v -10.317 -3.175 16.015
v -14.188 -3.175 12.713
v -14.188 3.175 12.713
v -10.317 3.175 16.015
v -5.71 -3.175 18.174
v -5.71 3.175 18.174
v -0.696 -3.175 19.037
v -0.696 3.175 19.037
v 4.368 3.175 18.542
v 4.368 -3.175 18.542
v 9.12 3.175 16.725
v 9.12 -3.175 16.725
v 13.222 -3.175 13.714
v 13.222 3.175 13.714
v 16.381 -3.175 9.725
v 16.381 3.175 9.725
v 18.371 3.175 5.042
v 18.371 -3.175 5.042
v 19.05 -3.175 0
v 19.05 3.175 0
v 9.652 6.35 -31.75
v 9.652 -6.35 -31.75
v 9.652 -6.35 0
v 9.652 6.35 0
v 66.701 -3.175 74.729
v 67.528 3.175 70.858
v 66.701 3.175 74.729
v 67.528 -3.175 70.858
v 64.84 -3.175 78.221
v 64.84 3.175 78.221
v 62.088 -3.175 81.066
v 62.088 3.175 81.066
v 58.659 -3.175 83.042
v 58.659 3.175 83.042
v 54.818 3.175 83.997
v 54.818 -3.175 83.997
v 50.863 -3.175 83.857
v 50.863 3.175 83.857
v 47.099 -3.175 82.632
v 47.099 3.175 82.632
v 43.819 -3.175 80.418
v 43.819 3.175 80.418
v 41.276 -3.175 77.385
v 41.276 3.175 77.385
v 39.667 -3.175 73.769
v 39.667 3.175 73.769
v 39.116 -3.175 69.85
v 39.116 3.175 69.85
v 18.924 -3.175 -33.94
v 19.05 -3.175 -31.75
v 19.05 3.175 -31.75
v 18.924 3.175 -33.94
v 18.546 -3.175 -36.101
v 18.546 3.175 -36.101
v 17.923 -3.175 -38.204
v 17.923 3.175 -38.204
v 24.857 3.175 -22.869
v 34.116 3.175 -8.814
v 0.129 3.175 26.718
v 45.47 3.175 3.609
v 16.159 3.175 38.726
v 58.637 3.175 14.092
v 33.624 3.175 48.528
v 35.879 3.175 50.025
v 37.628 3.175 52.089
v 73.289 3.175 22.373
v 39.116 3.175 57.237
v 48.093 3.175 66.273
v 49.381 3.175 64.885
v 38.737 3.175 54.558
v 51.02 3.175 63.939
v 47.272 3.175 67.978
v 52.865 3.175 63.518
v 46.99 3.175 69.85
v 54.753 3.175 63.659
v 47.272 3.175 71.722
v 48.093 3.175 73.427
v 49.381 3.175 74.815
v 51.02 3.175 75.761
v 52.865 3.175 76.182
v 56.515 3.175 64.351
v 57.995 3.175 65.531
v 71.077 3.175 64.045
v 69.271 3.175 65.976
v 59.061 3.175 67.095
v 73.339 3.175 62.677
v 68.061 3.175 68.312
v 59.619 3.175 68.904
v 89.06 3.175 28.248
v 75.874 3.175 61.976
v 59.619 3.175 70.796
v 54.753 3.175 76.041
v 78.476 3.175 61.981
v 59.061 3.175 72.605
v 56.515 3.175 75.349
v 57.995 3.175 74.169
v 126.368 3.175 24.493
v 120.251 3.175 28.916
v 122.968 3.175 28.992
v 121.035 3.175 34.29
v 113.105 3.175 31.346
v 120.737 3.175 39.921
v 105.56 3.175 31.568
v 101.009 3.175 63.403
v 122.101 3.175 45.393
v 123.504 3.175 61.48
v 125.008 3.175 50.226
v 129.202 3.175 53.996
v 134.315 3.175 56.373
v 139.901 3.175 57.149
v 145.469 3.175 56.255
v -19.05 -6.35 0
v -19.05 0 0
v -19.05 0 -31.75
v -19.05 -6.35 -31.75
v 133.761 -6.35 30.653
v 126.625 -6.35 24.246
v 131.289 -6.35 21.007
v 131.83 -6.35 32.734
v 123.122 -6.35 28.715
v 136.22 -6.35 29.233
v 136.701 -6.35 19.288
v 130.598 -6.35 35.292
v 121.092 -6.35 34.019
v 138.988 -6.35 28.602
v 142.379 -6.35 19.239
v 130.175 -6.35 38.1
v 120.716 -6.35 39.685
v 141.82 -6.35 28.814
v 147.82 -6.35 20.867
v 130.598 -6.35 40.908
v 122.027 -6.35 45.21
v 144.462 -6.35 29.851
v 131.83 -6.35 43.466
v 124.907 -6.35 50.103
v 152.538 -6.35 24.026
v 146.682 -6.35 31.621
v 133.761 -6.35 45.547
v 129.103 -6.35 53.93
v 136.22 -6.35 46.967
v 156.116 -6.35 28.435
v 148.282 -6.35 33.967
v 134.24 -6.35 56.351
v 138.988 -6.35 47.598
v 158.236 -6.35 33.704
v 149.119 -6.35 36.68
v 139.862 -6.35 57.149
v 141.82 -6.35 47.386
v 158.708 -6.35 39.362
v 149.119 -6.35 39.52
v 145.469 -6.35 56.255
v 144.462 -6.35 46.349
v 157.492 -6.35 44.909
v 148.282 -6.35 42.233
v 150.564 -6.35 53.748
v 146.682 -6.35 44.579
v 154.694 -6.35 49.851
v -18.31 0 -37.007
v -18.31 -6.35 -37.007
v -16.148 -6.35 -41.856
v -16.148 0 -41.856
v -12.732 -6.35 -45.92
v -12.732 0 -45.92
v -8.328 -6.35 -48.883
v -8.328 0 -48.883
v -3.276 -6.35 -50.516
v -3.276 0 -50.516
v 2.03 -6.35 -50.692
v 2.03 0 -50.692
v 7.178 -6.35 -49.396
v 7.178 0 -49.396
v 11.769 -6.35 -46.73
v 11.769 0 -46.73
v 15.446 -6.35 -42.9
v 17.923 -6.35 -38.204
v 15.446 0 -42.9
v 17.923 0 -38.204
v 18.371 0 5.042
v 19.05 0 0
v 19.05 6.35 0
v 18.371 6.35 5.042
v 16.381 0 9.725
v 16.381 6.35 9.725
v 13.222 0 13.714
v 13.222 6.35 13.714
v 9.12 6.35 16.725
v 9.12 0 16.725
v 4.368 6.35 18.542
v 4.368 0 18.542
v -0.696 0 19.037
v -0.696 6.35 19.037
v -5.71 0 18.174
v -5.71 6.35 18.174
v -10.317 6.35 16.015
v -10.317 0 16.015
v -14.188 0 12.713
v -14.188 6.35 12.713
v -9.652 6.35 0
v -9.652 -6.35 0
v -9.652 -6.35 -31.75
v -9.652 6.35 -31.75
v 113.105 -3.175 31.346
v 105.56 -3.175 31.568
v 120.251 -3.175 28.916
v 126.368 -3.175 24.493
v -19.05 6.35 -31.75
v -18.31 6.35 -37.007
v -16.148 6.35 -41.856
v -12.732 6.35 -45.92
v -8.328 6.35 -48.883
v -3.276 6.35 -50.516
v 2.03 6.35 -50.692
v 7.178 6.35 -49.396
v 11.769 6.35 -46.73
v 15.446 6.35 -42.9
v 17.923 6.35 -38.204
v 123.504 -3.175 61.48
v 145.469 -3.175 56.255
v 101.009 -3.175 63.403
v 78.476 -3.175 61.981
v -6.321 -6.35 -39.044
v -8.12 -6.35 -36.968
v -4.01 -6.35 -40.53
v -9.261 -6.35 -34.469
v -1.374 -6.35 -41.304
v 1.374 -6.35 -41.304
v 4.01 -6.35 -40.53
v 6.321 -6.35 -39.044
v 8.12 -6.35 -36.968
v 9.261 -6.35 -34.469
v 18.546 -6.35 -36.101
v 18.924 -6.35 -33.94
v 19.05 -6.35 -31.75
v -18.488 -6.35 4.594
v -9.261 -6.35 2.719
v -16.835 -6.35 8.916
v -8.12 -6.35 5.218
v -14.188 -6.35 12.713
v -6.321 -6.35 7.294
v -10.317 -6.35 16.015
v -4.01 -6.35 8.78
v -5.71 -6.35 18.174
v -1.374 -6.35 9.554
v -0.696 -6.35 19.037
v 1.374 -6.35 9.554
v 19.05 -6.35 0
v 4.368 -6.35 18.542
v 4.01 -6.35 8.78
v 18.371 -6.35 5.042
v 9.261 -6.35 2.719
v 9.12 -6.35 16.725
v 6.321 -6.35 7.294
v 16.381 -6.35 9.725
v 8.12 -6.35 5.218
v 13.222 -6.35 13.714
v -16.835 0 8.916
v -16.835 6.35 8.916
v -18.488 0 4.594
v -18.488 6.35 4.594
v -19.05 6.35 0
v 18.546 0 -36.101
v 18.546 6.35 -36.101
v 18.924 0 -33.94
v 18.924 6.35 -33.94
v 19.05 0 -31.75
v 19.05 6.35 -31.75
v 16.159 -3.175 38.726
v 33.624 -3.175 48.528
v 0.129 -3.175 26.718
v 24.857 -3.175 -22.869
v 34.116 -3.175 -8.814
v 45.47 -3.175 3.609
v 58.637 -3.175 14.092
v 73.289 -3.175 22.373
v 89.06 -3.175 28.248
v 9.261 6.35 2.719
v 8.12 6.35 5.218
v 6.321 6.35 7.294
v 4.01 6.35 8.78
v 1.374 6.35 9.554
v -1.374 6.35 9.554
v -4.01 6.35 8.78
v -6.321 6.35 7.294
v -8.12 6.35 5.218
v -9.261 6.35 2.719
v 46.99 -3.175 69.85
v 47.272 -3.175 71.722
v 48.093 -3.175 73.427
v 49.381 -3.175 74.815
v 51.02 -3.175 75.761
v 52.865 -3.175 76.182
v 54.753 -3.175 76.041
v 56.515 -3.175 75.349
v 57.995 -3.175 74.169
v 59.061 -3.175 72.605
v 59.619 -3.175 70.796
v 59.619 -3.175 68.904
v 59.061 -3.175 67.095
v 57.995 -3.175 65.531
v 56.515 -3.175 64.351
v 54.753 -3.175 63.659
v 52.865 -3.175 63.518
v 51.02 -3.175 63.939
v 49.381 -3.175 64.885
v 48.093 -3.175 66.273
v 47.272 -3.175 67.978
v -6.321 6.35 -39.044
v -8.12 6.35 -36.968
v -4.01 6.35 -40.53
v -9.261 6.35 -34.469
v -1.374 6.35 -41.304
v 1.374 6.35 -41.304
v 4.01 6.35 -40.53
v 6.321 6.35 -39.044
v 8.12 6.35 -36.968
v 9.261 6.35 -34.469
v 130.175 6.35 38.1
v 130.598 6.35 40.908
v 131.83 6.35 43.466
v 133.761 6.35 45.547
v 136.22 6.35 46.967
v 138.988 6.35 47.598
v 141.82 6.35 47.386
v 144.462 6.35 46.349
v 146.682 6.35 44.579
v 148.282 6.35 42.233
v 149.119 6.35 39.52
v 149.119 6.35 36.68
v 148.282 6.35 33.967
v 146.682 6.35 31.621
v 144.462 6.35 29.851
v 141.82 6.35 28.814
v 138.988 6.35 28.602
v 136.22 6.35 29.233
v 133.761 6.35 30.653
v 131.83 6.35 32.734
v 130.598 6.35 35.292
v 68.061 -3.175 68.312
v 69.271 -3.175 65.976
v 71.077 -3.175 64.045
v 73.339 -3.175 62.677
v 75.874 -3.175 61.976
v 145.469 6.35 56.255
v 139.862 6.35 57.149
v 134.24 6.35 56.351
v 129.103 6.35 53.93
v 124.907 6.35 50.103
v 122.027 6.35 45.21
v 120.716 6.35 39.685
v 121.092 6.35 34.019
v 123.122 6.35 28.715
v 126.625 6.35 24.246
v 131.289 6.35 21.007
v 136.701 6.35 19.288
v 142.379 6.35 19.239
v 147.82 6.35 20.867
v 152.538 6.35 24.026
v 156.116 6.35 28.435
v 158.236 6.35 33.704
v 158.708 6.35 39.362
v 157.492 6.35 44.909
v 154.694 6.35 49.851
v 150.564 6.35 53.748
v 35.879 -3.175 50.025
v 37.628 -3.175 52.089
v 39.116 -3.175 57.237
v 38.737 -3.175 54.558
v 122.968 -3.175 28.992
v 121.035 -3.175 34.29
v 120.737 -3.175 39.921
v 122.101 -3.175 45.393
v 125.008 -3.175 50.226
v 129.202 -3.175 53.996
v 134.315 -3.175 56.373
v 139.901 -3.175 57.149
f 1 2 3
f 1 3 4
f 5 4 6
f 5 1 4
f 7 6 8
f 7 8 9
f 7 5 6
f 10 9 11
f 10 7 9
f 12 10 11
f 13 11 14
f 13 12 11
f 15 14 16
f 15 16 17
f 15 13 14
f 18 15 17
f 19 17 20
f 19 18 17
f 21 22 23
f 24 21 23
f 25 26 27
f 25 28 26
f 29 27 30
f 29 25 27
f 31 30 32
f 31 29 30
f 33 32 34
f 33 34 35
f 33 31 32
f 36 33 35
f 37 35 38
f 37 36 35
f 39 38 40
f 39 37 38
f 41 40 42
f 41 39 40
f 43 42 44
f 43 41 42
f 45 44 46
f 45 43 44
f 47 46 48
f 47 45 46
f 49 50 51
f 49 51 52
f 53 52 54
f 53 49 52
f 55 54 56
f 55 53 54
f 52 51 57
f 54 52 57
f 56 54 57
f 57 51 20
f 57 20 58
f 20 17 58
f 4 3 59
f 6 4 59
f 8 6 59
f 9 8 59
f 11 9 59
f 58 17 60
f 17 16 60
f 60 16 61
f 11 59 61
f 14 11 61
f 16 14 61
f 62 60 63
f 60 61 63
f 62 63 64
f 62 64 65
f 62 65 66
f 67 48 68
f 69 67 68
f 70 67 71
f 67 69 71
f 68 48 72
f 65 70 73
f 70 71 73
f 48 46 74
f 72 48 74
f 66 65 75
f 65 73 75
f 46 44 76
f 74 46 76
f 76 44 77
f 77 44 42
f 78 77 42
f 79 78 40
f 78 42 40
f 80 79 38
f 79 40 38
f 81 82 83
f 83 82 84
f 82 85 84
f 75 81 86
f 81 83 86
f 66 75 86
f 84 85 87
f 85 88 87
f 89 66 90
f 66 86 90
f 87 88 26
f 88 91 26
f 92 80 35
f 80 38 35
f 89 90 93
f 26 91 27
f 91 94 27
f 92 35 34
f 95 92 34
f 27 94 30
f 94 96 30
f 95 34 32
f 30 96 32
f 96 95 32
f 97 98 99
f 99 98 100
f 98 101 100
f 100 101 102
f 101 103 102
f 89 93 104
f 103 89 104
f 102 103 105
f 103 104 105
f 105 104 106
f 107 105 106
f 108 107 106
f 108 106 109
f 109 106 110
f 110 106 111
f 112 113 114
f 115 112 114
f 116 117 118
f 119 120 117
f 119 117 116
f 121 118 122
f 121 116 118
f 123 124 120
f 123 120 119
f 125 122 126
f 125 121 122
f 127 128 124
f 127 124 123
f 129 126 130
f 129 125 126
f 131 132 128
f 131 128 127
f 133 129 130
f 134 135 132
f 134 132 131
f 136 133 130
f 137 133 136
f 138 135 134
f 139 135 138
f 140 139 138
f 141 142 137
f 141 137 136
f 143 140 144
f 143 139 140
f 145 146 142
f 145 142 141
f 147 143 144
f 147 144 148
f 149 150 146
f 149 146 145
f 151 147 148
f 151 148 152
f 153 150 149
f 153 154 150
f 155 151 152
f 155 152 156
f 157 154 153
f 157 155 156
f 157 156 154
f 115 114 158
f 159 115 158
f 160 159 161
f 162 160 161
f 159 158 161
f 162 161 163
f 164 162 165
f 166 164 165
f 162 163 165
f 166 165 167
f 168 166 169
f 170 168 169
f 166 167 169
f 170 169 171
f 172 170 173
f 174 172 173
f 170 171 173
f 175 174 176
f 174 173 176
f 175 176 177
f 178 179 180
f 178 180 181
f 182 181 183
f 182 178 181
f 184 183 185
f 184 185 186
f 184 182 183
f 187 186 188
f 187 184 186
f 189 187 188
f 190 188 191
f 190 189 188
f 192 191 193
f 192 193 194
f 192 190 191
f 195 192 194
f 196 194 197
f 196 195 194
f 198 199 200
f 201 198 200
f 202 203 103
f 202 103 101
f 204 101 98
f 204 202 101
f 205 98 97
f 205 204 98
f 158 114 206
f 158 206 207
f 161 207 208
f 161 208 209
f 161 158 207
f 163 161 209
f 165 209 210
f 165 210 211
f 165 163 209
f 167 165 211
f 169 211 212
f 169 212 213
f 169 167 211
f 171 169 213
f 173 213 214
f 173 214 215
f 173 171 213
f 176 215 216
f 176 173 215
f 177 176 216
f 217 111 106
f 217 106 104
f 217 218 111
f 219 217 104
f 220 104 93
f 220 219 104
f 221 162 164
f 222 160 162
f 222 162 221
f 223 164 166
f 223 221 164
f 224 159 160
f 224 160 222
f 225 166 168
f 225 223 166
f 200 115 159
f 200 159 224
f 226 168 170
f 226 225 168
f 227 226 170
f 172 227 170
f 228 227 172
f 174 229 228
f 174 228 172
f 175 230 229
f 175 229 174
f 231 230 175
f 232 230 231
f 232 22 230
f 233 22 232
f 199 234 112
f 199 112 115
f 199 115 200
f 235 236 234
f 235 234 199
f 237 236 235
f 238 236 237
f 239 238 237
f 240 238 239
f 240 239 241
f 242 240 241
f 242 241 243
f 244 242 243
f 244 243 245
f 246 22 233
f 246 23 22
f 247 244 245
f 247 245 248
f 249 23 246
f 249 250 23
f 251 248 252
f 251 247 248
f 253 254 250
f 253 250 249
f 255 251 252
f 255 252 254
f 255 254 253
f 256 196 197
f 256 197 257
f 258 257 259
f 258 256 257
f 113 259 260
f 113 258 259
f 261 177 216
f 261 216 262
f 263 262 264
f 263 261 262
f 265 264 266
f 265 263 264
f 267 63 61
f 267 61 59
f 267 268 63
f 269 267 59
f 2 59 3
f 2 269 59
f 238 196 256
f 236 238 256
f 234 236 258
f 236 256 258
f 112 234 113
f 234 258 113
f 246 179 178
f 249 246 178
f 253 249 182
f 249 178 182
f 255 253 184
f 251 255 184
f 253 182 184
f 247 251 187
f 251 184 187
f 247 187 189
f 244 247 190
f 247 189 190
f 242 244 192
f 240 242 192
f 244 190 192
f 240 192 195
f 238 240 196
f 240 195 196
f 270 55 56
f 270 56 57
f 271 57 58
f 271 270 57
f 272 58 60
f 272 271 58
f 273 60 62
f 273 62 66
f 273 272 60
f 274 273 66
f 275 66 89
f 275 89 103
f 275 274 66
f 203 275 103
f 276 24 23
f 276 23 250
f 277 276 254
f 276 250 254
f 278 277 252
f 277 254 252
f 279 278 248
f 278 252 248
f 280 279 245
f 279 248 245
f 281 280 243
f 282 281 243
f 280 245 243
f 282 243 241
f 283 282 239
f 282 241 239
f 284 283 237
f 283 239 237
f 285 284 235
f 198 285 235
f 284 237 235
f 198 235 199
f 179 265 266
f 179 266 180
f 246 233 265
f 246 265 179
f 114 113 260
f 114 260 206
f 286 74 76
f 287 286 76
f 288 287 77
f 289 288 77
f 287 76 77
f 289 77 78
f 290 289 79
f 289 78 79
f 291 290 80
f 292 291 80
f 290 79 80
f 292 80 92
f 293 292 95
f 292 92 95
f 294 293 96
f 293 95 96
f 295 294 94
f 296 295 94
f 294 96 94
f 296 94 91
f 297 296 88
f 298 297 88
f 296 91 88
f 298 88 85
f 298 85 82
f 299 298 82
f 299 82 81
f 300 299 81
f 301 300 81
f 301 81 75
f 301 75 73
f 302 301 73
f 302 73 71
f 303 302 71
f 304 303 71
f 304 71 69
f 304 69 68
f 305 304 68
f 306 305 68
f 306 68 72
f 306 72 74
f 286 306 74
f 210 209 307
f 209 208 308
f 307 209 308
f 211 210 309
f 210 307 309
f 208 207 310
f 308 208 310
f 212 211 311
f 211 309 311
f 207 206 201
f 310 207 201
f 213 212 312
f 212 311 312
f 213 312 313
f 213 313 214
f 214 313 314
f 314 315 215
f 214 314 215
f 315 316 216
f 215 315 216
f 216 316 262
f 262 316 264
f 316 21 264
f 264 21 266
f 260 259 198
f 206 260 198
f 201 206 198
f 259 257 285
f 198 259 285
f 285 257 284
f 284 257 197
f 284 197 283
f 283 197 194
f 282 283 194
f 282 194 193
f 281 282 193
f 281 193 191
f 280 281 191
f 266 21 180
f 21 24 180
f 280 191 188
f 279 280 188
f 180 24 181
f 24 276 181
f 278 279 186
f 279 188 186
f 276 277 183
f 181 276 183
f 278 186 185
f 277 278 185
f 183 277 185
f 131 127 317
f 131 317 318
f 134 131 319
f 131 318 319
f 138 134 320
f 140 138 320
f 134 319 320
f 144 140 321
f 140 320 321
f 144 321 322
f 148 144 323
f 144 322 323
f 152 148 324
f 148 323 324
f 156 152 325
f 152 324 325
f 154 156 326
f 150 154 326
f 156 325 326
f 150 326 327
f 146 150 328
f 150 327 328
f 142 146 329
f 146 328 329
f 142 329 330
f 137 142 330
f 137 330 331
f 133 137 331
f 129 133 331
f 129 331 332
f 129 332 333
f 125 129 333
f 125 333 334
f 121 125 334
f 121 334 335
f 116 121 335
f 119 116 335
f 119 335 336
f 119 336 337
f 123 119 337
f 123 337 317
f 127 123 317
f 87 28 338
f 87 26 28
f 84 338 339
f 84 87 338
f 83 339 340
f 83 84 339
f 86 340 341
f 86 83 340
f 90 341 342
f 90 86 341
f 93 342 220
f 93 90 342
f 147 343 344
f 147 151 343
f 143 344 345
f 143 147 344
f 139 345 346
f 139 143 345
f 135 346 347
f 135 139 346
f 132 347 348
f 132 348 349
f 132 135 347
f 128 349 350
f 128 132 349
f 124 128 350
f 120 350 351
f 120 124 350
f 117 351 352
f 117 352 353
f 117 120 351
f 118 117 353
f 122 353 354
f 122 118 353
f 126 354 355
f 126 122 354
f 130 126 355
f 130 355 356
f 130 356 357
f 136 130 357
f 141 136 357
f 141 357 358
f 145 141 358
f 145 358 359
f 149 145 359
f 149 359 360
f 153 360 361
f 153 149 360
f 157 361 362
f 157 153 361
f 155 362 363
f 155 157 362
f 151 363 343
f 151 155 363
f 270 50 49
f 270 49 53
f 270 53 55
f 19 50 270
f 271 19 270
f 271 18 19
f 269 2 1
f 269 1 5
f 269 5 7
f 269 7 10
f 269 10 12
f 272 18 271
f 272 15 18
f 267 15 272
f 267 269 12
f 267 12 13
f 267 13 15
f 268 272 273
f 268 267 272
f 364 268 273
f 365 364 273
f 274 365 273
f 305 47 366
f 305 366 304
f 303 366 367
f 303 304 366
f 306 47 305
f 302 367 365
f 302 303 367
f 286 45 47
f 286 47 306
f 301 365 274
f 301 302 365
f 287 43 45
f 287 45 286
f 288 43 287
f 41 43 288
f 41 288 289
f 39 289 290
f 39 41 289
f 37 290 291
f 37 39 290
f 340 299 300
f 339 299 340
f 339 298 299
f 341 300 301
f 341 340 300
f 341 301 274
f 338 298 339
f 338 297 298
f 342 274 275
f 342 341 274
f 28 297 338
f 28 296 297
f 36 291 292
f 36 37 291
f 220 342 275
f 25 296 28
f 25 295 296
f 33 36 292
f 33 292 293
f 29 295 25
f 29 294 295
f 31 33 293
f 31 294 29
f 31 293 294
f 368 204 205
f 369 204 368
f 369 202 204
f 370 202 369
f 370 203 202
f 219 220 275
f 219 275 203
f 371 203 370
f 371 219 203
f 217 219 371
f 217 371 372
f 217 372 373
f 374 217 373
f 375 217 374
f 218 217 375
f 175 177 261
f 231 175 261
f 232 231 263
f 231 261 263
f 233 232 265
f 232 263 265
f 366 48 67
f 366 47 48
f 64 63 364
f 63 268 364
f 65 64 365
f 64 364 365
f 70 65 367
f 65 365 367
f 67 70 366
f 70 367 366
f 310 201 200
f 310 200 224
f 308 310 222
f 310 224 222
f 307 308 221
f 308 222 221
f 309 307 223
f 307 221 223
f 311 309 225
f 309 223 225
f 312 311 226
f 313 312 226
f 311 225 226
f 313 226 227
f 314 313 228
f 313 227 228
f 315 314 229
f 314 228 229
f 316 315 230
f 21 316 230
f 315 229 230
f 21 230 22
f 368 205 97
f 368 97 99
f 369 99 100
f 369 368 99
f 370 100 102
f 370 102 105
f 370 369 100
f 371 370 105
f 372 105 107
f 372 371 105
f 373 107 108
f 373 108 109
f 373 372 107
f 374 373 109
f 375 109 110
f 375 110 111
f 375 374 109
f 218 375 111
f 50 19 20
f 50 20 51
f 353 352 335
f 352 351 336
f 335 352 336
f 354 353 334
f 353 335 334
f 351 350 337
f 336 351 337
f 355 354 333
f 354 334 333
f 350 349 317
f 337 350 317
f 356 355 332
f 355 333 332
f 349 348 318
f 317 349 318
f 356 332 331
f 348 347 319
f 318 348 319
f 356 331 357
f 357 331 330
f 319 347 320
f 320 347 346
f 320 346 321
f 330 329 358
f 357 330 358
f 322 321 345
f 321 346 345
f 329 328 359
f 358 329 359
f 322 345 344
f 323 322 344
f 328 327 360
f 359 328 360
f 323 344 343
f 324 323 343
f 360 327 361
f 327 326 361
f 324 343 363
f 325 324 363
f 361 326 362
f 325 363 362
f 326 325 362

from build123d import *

# Parameters (mm, degrees)
F1_DEPTH = 6.35
F2_DEPTH = 3.175
F4_D     = 19.05
F6_DEPTH = 12.7
F7_R     = 9.652
F9_D     = 12.7


with BuildPart() as f1:
    # F0 (on Front) → F1 (new body, symmetric)
    with BuildSketch(Plane.XZ):
        with BuildLine():
            Line((19.05, -31.75), (19.05, 0))
            ThreePointArc((19.05, 0), (6.8053054878, 17.7929850564), (-14.1878285794, 12.7125143148))
            ThreePointArc((-14.1878285794, 12.7125143148), (-17.7929850564, 6.8053054878), (-19.05, 0))
            Line((-19.05, 0), (-19.05, -31.75))
            ThreePointArc((-19.05, -31.75), (-3.275991202, -50.516203176), (17.9232684141, -38.2043744356))
            ThreePointArc((17.9232684141, -38.2043744356), (18.766203176, -35.025991202), (19.05, -31.75))
        make_face()
    extrude(amount=F1_DEPTH, both=True)

    # F5 (on face) → F6 (cut, through all)
    with BuildSketch(Plane.XZ.offset(6.35)):
        with BuildLine():
            Line((9.652, -31.75), (9.652, 0))
            ThreePointArc((9.652, 0), (0, 9.652), (-9.652, 0))
            Line((-9.652, 0), (-9.652, -31.75))
            ThreePointArc((-9.652, -31.75), (0, -41.402), (9.652, -31.75))
        make_face()
    extrude(amount=-F6_DEPTH, mode=Mode.SUBTRACT)


with BuildPart() as f1b:
    # F0 (on Front) → F1, piece 2 (new body, symmetric)
    with BuildSketch(Plane.XZ):
        with BuildLine():
            ThreePointArc((145.4693142778, 56.2553714576), (123.3747519158, 47.917778516), (126.3677772571, 24.4928571429))
            ThreePointArc((126.3677772571, 24.4928571429), (147.0798257686, 20.5375209146), (158.75, 38.1))
            ThreePointArc((158.75, 38.1), (155.0754339287, 49.3471565964), (145.4693142778, 56.2553714576))
        make_face()
    extrude(amount=F1_DEPTH, both=True)

    # F4 (through all)
    with Locations(Plane.XZ.offset(6.35)):
        with Locations((139.7, 38.1)):
            Hole(F4_D / 2)


with BuildPart() as f2:
    # F0 (on Front) → F2 (new body, symmetric)
    with BuildSketch(Plane.XZ):
        with BuildLine():
            ThreePointArc((-14.1878285794, 12.7125143148), (6.8053054878, 17.7929850564), (19.05, 0))
            Line((19.05, 0), (19.05, -31.75))
            ThreePointArc((19.05, -31.75), (18.766203176, -35.025991202), (17.9232684141, -38.2043744356))
            ThreePointArc((17.9232684141, -38.2043744356), (51.8465590404, 9.110202113), (105.5595767458, 31.5683972734))
            ThreePointArc((105.5595767458, 31.5683972734), (116.7685886634, 30.3977628537), (126.3677772571, 24.4928571429))
            ThreePointArc((126.3677772571, 24.4928571429), (123.3747519158, 47.917778516), (145.4693142778, 56.2553714576))
            ThreePointArc((145.4693142778, 56.2553714576), (106.7647166675, 63.2302001437), (67.564, 60.0682507246))
            ThreePointArc((67.564, 60.0682507246), (64.9675106843, 59.4914343869), (62.3814834159, 58.8693919276))
            ThreePointArc((62.3814834159, 58.8693919276), (57.2947405008, 56.1868303981), (51.5615653408, 55.7376172755))
            ThreePointArc((51.5615653408, 55.7376172755), (45.2872454924, 53.5142711807), (39.116, 51.0190584665))
            ThreePointArc((39.116, 51.0190584665), (10.3772128751, 34.7696847804), (-14.1878285794, 12.7125143148))
        make_face()
        with BuildLine():
            Line((39.116, 69.85), (39.116, 51.0190584665))
            ThreePointArc((39.116, 51.0190584665), (45.2872454924, 53.5142711807), (51.5615653408, 55.7376172755))
            ThreePointArc((51.5615653408, 55.7376172755), (42.6718551146, 60.441872625), (39.116, 69.85))
        make_face()
        with BuildLine():
            ThreePointArc((39.116, 69.85), (42.6718551146, 60.441872625), (51.5615653408, 55.7376172755))
            ThreePointArc((51.5615653408, 55.7376172755), (56.9425804041, 57.4035026746), (62.3814834159, 58.8693919276))
            ThreePointArc((62.3814834159, 58.8693919276), (66.2032856632, 63.7789162462), (67.564, 69.85))
            ThreePointArc((67.564, 69.85), (53.34, 84.074), (39.116, 69.85))
        make_face()
        with BuildLine():
            ThreePointArc((62.3814834159, 58.8693919276), (56.9425804041, 57.4035026746), (51.5615653408, 55.7376172755))
            ThreePointArc((51.5615653408, 55.7376172755), (57.2947405008, 56.1868303981), (62.3814834159, 58.8693919276))
        make_face()
        with BuildLine():
            ThreePointArc((67.564, 69.85), (66.2032856632, 63.7789162462), (62.3814834159, 58.8693919276))
            ThreePointArc((62.3814834159, 58.8693919276), (64.9675106843, 59.4914343869), (67.564, 60.0682507246))
            Line((67.564, 60.0682507246), (67.564, 69.85))
        make_face()
    extrude(amount=F2_DEPTH, both=True)

    # F7
    f7_edges = [f2.edges().sort_by_distance(p)[0] for p in [
        (67.564, 0, 60.068251),
        (39.116, 0, 51.019058),
    ]]
    fillet(f7_edges, radius=F7_R)

    # F9 (through all)
    with Locations(Plane.XZ.offset(3.175)):
        with Locations((53.34, 69.85)):
            Hole(F9_D / 2)


solid = Compound([f1.part, f1b.part, f2.part])
